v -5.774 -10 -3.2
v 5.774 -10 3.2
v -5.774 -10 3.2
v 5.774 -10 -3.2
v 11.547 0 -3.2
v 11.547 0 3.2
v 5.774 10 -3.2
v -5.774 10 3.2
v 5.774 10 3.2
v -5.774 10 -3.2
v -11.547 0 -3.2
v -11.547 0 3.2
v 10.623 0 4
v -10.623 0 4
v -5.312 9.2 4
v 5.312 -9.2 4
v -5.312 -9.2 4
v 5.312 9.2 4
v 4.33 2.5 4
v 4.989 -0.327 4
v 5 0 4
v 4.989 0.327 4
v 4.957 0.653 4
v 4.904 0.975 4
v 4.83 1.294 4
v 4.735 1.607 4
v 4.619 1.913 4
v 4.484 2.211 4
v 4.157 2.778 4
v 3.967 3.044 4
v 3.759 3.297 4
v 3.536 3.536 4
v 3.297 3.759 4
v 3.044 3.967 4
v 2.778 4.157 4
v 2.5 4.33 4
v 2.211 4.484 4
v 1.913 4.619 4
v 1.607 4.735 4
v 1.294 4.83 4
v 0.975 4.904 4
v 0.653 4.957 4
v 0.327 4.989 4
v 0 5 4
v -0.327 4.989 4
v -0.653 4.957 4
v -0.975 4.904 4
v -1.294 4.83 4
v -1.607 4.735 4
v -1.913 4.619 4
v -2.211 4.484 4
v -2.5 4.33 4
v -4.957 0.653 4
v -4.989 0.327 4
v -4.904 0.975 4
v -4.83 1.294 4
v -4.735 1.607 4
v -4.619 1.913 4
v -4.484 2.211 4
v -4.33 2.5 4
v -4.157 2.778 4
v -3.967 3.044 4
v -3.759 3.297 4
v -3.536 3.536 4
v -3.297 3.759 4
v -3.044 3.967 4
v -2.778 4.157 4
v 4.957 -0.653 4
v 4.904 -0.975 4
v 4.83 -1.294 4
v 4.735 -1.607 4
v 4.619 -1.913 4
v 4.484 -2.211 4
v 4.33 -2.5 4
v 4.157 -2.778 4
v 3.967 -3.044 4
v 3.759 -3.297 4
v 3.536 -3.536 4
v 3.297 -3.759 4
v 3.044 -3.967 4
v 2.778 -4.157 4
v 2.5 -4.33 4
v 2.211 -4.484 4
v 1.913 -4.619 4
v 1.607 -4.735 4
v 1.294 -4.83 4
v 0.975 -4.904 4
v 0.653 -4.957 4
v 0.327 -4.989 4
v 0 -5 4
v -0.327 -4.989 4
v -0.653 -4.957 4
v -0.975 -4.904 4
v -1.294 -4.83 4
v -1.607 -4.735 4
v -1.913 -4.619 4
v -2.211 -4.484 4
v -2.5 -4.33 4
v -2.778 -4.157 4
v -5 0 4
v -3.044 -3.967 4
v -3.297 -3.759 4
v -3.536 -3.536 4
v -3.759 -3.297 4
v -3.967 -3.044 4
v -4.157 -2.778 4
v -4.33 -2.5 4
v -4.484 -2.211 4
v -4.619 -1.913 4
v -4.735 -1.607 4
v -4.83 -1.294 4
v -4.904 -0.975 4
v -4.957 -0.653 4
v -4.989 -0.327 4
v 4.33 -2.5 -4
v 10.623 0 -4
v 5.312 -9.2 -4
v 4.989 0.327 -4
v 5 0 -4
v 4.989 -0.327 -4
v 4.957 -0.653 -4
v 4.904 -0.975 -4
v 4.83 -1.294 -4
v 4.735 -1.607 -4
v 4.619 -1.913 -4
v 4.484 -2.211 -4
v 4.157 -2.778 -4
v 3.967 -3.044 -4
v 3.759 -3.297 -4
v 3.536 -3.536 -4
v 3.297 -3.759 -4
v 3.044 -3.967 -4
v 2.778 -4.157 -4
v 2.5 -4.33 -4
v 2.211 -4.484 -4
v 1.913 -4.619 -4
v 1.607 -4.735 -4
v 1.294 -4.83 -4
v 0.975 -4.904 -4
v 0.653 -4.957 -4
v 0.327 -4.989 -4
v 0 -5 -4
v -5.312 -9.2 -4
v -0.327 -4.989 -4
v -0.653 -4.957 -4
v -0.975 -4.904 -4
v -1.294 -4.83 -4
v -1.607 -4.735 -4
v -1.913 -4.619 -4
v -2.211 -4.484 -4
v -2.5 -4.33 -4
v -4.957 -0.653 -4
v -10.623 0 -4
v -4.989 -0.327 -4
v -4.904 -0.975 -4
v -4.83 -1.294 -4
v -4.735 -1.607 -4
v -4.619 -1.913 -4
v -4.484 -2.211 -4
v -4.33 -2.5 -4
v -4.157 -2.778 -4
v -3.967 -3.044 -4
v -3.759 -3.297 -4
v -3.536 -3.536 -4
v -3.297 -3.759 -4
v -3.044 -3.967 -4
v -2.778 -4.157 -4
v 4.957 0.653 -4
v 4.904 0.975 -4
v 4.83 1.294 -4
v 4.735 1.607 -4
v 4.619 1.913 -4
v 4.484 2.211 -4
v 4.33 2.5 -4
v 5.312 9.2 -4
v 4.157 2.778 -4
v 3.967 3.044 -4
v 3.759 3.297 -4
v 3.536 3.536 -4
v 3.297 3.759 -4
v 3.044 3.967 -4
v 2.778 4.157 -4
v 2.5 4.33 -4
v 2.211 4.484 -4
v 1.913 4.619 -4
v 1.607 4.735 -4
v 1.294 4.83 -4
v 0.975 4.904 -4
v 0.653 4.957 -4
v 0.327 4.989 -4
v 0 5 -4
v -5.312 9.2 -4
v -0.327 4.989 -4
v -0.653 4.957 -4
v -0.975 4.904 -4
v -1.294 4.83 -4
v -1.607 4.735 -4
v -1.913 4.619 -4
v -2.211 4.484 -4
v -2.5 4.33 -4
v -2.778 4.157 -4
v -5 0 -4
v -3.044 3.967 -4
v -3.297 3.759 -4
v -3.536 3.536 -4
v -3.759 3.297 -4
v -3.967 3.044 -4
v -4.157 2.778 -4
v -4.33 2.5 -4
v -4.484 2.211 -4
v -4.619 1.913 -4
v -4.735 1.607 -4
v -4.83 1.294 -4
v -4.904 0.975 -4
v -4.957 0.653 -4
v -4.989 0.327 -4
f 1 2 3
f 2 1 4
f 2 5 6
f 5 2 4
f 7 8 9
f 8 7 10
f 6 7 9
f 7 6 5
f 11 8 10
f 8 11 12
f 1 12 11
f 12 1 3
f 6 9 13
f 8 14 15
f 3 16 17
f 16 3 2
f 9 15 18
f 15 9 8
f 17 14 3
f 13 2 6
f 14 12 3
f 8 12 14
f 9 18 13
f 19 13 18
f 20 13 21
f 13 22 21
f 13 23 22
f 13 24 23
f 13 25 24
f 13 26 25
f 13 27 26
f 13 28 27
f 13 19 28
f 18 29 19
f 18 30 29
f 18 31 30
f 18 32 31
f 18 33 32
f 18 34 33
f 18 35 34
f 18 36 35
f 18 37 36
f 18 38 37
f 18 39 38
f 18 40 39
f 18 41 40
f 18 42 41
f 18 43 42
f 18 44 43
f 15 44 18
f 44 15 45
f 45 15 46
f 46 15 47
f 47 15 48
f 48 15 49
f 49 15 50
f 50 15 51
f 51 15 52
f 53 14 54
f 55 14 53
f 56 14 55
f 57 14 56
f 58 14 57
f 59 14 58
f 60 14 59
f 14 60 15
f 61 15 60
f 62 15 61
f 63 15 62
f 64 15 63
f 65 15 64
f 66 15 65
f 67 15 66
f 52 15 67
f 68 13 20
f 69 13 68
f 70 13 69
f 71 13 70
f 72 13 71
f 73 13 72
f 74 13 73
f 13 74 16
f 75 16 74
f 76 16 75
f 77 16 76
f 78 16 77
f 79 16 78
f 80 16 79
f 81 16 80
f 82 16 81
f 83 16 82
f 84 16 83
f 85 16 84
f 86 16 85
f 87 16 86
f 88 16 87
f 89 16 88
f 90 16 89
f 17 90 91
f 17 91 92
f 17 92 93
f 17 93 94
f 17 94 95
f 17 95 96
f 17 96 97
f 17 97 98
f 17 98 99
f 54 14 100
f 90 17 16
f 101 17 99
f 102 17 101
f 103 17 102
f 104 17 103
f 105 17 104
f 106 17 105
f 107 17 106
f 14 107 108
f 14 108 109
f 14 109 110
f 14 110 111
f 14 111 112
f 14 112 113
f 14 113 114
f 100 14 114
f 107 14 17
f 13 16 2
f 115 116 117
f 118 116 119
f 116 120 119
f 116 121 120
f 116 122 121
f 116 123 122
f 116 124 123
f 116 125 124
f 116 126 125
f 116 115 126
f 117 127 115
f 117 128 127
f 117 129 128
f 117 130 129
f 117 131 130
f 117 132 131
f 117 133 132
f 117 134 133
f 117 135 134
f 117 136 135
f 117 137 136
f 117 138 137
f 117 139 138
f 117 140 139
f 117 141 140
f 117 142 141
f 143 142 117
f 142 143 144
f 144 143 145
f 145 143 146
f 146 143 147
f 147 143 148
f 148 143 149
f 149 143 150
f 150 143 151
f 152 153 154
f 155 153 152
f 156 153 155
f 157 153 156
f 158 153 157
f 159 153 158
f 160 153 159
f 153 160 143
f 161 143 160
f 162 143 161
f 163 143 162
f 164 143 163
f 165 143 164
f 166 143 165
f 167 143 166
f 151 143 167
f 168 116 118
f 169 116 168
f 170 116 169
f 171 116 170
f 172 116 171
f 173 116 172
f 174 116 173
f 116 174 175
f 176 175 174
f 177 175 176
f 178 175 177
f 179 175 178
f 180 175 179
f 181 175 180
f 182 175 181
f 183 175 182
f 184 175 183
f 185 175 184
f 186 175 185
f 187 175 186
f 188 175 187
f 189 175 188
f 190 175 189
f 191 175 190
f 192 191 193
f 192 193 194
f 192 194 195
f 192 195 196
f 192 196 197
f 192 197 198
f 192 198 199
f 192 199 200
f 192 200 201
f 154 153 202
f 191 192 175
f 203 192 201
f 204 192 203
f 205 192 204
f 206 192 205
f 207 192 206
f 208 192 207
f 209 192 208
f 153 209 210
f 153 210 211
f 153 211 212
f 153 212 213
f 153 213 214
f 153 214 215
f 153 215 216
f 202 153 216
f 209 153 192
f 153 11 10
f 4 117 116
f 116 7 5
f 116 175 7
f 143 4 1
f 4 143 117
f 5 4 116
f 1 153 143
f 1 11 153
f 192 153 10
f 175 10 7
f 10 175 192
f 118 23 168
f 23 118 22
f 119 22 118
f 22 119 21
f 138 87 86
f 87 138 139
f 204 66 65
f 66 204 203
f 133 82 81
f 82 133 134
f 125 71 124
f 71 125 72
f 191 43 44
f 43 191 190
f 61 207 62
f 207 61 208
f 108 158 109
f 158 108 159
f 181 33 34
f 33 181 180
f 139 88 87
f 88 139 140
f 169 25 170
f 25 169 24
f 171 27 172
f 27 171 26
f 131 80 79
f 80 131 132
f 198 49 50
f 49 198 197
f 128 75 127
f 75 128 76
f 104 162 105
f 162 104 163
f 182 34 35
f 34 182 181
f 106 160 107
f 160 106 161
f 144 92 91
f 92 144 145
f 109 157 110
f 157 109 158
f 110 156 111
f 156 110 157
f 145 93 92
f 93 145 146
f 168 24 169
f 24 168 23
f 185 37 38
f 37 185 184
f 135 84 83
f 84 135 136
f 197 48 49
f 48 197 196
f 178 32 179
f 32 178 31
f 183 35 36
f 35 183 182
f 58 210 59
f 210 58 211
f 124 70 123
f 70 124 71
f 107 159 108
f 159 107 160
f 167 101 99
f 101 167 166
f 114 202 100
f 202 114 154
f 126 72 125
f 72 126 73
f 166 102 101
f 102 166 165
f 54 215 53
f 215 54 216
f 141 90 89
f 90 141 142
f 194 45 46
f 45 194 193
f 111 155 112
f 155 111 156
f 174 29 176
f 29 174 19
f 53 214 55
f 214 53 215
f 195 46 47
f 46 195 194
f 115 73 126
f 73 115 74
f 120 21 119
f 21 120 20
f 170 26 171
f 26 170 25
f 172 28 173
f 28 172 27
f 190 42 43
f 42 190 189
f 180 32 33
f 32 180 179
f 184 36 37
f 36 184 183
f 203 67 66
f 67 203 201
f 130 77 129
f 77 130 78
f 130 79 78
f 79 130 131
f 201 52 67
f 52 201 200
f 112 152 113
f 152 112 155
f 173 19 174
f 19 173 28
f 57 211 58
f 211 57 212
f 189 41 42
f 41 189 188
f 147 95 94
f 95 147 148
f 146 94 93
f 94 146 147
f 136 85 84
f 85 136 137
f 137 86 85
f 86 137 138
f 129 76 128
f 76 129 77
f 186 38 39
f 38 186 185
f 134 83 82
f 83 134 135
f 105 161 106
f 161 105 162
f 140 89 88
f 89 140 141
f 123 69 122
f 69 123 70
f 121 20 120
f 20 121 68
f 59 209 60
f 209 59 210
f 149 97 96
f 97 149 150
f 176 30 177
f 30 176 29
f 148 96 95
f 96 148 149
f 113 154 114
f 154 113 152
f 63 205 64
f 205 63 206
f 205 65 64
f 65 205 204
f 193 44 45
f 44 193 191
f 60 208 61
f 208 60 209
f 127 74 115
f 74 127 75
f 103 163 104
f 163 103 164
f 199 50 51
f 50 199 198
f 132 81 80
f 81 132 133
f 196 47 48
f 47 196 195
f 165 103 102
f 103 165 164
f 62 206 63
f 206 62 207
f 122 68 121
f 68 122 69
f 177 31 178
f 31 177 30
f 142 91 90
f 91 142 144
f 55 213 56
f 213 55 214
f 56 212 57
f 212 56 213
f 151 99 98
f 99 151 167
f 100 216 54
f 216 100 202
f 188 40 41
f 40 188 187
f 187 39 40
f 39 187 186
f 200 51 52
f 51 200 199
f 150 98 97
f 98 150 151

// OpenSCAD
$fn=96;

module hex_prism_flat_to_flat(flat=20, h=8){
    r = flat / sqrt(3);
    cylinder(h=h, r=r, center=true, $fn=6);
}

module chamfered_hex_ring(flat=20, h=8, hole_d=10, chamfer=0.8){
    difference(){
        union(){
            translate([0,0,0]) hex_prism_flat_to_flat(flat=flat, h=h-2*chamfer);
            translate([0,0,(h-2*chamfer)/2]) cylinder(h=chamfer, r1=flat/sqrt(3), r2=(flat-2*chamfer)/sqrt(3), center=false, $fn=6);
            translate([0,0,-(h-2*chamfer)/2 - chamfer]) cylinder(h=chamfer, r1=(flat-2*chamfer)/sqrt(3), r2=flat/sqrt(3), center=false, $fn=6);
        }
        cylinder(h=h+2, d=hole_d, center=true, $fn=96);
    }
}

chamfered_hex_ring(flat=20, h=8, hole_d=10, chamfer=0.8);
